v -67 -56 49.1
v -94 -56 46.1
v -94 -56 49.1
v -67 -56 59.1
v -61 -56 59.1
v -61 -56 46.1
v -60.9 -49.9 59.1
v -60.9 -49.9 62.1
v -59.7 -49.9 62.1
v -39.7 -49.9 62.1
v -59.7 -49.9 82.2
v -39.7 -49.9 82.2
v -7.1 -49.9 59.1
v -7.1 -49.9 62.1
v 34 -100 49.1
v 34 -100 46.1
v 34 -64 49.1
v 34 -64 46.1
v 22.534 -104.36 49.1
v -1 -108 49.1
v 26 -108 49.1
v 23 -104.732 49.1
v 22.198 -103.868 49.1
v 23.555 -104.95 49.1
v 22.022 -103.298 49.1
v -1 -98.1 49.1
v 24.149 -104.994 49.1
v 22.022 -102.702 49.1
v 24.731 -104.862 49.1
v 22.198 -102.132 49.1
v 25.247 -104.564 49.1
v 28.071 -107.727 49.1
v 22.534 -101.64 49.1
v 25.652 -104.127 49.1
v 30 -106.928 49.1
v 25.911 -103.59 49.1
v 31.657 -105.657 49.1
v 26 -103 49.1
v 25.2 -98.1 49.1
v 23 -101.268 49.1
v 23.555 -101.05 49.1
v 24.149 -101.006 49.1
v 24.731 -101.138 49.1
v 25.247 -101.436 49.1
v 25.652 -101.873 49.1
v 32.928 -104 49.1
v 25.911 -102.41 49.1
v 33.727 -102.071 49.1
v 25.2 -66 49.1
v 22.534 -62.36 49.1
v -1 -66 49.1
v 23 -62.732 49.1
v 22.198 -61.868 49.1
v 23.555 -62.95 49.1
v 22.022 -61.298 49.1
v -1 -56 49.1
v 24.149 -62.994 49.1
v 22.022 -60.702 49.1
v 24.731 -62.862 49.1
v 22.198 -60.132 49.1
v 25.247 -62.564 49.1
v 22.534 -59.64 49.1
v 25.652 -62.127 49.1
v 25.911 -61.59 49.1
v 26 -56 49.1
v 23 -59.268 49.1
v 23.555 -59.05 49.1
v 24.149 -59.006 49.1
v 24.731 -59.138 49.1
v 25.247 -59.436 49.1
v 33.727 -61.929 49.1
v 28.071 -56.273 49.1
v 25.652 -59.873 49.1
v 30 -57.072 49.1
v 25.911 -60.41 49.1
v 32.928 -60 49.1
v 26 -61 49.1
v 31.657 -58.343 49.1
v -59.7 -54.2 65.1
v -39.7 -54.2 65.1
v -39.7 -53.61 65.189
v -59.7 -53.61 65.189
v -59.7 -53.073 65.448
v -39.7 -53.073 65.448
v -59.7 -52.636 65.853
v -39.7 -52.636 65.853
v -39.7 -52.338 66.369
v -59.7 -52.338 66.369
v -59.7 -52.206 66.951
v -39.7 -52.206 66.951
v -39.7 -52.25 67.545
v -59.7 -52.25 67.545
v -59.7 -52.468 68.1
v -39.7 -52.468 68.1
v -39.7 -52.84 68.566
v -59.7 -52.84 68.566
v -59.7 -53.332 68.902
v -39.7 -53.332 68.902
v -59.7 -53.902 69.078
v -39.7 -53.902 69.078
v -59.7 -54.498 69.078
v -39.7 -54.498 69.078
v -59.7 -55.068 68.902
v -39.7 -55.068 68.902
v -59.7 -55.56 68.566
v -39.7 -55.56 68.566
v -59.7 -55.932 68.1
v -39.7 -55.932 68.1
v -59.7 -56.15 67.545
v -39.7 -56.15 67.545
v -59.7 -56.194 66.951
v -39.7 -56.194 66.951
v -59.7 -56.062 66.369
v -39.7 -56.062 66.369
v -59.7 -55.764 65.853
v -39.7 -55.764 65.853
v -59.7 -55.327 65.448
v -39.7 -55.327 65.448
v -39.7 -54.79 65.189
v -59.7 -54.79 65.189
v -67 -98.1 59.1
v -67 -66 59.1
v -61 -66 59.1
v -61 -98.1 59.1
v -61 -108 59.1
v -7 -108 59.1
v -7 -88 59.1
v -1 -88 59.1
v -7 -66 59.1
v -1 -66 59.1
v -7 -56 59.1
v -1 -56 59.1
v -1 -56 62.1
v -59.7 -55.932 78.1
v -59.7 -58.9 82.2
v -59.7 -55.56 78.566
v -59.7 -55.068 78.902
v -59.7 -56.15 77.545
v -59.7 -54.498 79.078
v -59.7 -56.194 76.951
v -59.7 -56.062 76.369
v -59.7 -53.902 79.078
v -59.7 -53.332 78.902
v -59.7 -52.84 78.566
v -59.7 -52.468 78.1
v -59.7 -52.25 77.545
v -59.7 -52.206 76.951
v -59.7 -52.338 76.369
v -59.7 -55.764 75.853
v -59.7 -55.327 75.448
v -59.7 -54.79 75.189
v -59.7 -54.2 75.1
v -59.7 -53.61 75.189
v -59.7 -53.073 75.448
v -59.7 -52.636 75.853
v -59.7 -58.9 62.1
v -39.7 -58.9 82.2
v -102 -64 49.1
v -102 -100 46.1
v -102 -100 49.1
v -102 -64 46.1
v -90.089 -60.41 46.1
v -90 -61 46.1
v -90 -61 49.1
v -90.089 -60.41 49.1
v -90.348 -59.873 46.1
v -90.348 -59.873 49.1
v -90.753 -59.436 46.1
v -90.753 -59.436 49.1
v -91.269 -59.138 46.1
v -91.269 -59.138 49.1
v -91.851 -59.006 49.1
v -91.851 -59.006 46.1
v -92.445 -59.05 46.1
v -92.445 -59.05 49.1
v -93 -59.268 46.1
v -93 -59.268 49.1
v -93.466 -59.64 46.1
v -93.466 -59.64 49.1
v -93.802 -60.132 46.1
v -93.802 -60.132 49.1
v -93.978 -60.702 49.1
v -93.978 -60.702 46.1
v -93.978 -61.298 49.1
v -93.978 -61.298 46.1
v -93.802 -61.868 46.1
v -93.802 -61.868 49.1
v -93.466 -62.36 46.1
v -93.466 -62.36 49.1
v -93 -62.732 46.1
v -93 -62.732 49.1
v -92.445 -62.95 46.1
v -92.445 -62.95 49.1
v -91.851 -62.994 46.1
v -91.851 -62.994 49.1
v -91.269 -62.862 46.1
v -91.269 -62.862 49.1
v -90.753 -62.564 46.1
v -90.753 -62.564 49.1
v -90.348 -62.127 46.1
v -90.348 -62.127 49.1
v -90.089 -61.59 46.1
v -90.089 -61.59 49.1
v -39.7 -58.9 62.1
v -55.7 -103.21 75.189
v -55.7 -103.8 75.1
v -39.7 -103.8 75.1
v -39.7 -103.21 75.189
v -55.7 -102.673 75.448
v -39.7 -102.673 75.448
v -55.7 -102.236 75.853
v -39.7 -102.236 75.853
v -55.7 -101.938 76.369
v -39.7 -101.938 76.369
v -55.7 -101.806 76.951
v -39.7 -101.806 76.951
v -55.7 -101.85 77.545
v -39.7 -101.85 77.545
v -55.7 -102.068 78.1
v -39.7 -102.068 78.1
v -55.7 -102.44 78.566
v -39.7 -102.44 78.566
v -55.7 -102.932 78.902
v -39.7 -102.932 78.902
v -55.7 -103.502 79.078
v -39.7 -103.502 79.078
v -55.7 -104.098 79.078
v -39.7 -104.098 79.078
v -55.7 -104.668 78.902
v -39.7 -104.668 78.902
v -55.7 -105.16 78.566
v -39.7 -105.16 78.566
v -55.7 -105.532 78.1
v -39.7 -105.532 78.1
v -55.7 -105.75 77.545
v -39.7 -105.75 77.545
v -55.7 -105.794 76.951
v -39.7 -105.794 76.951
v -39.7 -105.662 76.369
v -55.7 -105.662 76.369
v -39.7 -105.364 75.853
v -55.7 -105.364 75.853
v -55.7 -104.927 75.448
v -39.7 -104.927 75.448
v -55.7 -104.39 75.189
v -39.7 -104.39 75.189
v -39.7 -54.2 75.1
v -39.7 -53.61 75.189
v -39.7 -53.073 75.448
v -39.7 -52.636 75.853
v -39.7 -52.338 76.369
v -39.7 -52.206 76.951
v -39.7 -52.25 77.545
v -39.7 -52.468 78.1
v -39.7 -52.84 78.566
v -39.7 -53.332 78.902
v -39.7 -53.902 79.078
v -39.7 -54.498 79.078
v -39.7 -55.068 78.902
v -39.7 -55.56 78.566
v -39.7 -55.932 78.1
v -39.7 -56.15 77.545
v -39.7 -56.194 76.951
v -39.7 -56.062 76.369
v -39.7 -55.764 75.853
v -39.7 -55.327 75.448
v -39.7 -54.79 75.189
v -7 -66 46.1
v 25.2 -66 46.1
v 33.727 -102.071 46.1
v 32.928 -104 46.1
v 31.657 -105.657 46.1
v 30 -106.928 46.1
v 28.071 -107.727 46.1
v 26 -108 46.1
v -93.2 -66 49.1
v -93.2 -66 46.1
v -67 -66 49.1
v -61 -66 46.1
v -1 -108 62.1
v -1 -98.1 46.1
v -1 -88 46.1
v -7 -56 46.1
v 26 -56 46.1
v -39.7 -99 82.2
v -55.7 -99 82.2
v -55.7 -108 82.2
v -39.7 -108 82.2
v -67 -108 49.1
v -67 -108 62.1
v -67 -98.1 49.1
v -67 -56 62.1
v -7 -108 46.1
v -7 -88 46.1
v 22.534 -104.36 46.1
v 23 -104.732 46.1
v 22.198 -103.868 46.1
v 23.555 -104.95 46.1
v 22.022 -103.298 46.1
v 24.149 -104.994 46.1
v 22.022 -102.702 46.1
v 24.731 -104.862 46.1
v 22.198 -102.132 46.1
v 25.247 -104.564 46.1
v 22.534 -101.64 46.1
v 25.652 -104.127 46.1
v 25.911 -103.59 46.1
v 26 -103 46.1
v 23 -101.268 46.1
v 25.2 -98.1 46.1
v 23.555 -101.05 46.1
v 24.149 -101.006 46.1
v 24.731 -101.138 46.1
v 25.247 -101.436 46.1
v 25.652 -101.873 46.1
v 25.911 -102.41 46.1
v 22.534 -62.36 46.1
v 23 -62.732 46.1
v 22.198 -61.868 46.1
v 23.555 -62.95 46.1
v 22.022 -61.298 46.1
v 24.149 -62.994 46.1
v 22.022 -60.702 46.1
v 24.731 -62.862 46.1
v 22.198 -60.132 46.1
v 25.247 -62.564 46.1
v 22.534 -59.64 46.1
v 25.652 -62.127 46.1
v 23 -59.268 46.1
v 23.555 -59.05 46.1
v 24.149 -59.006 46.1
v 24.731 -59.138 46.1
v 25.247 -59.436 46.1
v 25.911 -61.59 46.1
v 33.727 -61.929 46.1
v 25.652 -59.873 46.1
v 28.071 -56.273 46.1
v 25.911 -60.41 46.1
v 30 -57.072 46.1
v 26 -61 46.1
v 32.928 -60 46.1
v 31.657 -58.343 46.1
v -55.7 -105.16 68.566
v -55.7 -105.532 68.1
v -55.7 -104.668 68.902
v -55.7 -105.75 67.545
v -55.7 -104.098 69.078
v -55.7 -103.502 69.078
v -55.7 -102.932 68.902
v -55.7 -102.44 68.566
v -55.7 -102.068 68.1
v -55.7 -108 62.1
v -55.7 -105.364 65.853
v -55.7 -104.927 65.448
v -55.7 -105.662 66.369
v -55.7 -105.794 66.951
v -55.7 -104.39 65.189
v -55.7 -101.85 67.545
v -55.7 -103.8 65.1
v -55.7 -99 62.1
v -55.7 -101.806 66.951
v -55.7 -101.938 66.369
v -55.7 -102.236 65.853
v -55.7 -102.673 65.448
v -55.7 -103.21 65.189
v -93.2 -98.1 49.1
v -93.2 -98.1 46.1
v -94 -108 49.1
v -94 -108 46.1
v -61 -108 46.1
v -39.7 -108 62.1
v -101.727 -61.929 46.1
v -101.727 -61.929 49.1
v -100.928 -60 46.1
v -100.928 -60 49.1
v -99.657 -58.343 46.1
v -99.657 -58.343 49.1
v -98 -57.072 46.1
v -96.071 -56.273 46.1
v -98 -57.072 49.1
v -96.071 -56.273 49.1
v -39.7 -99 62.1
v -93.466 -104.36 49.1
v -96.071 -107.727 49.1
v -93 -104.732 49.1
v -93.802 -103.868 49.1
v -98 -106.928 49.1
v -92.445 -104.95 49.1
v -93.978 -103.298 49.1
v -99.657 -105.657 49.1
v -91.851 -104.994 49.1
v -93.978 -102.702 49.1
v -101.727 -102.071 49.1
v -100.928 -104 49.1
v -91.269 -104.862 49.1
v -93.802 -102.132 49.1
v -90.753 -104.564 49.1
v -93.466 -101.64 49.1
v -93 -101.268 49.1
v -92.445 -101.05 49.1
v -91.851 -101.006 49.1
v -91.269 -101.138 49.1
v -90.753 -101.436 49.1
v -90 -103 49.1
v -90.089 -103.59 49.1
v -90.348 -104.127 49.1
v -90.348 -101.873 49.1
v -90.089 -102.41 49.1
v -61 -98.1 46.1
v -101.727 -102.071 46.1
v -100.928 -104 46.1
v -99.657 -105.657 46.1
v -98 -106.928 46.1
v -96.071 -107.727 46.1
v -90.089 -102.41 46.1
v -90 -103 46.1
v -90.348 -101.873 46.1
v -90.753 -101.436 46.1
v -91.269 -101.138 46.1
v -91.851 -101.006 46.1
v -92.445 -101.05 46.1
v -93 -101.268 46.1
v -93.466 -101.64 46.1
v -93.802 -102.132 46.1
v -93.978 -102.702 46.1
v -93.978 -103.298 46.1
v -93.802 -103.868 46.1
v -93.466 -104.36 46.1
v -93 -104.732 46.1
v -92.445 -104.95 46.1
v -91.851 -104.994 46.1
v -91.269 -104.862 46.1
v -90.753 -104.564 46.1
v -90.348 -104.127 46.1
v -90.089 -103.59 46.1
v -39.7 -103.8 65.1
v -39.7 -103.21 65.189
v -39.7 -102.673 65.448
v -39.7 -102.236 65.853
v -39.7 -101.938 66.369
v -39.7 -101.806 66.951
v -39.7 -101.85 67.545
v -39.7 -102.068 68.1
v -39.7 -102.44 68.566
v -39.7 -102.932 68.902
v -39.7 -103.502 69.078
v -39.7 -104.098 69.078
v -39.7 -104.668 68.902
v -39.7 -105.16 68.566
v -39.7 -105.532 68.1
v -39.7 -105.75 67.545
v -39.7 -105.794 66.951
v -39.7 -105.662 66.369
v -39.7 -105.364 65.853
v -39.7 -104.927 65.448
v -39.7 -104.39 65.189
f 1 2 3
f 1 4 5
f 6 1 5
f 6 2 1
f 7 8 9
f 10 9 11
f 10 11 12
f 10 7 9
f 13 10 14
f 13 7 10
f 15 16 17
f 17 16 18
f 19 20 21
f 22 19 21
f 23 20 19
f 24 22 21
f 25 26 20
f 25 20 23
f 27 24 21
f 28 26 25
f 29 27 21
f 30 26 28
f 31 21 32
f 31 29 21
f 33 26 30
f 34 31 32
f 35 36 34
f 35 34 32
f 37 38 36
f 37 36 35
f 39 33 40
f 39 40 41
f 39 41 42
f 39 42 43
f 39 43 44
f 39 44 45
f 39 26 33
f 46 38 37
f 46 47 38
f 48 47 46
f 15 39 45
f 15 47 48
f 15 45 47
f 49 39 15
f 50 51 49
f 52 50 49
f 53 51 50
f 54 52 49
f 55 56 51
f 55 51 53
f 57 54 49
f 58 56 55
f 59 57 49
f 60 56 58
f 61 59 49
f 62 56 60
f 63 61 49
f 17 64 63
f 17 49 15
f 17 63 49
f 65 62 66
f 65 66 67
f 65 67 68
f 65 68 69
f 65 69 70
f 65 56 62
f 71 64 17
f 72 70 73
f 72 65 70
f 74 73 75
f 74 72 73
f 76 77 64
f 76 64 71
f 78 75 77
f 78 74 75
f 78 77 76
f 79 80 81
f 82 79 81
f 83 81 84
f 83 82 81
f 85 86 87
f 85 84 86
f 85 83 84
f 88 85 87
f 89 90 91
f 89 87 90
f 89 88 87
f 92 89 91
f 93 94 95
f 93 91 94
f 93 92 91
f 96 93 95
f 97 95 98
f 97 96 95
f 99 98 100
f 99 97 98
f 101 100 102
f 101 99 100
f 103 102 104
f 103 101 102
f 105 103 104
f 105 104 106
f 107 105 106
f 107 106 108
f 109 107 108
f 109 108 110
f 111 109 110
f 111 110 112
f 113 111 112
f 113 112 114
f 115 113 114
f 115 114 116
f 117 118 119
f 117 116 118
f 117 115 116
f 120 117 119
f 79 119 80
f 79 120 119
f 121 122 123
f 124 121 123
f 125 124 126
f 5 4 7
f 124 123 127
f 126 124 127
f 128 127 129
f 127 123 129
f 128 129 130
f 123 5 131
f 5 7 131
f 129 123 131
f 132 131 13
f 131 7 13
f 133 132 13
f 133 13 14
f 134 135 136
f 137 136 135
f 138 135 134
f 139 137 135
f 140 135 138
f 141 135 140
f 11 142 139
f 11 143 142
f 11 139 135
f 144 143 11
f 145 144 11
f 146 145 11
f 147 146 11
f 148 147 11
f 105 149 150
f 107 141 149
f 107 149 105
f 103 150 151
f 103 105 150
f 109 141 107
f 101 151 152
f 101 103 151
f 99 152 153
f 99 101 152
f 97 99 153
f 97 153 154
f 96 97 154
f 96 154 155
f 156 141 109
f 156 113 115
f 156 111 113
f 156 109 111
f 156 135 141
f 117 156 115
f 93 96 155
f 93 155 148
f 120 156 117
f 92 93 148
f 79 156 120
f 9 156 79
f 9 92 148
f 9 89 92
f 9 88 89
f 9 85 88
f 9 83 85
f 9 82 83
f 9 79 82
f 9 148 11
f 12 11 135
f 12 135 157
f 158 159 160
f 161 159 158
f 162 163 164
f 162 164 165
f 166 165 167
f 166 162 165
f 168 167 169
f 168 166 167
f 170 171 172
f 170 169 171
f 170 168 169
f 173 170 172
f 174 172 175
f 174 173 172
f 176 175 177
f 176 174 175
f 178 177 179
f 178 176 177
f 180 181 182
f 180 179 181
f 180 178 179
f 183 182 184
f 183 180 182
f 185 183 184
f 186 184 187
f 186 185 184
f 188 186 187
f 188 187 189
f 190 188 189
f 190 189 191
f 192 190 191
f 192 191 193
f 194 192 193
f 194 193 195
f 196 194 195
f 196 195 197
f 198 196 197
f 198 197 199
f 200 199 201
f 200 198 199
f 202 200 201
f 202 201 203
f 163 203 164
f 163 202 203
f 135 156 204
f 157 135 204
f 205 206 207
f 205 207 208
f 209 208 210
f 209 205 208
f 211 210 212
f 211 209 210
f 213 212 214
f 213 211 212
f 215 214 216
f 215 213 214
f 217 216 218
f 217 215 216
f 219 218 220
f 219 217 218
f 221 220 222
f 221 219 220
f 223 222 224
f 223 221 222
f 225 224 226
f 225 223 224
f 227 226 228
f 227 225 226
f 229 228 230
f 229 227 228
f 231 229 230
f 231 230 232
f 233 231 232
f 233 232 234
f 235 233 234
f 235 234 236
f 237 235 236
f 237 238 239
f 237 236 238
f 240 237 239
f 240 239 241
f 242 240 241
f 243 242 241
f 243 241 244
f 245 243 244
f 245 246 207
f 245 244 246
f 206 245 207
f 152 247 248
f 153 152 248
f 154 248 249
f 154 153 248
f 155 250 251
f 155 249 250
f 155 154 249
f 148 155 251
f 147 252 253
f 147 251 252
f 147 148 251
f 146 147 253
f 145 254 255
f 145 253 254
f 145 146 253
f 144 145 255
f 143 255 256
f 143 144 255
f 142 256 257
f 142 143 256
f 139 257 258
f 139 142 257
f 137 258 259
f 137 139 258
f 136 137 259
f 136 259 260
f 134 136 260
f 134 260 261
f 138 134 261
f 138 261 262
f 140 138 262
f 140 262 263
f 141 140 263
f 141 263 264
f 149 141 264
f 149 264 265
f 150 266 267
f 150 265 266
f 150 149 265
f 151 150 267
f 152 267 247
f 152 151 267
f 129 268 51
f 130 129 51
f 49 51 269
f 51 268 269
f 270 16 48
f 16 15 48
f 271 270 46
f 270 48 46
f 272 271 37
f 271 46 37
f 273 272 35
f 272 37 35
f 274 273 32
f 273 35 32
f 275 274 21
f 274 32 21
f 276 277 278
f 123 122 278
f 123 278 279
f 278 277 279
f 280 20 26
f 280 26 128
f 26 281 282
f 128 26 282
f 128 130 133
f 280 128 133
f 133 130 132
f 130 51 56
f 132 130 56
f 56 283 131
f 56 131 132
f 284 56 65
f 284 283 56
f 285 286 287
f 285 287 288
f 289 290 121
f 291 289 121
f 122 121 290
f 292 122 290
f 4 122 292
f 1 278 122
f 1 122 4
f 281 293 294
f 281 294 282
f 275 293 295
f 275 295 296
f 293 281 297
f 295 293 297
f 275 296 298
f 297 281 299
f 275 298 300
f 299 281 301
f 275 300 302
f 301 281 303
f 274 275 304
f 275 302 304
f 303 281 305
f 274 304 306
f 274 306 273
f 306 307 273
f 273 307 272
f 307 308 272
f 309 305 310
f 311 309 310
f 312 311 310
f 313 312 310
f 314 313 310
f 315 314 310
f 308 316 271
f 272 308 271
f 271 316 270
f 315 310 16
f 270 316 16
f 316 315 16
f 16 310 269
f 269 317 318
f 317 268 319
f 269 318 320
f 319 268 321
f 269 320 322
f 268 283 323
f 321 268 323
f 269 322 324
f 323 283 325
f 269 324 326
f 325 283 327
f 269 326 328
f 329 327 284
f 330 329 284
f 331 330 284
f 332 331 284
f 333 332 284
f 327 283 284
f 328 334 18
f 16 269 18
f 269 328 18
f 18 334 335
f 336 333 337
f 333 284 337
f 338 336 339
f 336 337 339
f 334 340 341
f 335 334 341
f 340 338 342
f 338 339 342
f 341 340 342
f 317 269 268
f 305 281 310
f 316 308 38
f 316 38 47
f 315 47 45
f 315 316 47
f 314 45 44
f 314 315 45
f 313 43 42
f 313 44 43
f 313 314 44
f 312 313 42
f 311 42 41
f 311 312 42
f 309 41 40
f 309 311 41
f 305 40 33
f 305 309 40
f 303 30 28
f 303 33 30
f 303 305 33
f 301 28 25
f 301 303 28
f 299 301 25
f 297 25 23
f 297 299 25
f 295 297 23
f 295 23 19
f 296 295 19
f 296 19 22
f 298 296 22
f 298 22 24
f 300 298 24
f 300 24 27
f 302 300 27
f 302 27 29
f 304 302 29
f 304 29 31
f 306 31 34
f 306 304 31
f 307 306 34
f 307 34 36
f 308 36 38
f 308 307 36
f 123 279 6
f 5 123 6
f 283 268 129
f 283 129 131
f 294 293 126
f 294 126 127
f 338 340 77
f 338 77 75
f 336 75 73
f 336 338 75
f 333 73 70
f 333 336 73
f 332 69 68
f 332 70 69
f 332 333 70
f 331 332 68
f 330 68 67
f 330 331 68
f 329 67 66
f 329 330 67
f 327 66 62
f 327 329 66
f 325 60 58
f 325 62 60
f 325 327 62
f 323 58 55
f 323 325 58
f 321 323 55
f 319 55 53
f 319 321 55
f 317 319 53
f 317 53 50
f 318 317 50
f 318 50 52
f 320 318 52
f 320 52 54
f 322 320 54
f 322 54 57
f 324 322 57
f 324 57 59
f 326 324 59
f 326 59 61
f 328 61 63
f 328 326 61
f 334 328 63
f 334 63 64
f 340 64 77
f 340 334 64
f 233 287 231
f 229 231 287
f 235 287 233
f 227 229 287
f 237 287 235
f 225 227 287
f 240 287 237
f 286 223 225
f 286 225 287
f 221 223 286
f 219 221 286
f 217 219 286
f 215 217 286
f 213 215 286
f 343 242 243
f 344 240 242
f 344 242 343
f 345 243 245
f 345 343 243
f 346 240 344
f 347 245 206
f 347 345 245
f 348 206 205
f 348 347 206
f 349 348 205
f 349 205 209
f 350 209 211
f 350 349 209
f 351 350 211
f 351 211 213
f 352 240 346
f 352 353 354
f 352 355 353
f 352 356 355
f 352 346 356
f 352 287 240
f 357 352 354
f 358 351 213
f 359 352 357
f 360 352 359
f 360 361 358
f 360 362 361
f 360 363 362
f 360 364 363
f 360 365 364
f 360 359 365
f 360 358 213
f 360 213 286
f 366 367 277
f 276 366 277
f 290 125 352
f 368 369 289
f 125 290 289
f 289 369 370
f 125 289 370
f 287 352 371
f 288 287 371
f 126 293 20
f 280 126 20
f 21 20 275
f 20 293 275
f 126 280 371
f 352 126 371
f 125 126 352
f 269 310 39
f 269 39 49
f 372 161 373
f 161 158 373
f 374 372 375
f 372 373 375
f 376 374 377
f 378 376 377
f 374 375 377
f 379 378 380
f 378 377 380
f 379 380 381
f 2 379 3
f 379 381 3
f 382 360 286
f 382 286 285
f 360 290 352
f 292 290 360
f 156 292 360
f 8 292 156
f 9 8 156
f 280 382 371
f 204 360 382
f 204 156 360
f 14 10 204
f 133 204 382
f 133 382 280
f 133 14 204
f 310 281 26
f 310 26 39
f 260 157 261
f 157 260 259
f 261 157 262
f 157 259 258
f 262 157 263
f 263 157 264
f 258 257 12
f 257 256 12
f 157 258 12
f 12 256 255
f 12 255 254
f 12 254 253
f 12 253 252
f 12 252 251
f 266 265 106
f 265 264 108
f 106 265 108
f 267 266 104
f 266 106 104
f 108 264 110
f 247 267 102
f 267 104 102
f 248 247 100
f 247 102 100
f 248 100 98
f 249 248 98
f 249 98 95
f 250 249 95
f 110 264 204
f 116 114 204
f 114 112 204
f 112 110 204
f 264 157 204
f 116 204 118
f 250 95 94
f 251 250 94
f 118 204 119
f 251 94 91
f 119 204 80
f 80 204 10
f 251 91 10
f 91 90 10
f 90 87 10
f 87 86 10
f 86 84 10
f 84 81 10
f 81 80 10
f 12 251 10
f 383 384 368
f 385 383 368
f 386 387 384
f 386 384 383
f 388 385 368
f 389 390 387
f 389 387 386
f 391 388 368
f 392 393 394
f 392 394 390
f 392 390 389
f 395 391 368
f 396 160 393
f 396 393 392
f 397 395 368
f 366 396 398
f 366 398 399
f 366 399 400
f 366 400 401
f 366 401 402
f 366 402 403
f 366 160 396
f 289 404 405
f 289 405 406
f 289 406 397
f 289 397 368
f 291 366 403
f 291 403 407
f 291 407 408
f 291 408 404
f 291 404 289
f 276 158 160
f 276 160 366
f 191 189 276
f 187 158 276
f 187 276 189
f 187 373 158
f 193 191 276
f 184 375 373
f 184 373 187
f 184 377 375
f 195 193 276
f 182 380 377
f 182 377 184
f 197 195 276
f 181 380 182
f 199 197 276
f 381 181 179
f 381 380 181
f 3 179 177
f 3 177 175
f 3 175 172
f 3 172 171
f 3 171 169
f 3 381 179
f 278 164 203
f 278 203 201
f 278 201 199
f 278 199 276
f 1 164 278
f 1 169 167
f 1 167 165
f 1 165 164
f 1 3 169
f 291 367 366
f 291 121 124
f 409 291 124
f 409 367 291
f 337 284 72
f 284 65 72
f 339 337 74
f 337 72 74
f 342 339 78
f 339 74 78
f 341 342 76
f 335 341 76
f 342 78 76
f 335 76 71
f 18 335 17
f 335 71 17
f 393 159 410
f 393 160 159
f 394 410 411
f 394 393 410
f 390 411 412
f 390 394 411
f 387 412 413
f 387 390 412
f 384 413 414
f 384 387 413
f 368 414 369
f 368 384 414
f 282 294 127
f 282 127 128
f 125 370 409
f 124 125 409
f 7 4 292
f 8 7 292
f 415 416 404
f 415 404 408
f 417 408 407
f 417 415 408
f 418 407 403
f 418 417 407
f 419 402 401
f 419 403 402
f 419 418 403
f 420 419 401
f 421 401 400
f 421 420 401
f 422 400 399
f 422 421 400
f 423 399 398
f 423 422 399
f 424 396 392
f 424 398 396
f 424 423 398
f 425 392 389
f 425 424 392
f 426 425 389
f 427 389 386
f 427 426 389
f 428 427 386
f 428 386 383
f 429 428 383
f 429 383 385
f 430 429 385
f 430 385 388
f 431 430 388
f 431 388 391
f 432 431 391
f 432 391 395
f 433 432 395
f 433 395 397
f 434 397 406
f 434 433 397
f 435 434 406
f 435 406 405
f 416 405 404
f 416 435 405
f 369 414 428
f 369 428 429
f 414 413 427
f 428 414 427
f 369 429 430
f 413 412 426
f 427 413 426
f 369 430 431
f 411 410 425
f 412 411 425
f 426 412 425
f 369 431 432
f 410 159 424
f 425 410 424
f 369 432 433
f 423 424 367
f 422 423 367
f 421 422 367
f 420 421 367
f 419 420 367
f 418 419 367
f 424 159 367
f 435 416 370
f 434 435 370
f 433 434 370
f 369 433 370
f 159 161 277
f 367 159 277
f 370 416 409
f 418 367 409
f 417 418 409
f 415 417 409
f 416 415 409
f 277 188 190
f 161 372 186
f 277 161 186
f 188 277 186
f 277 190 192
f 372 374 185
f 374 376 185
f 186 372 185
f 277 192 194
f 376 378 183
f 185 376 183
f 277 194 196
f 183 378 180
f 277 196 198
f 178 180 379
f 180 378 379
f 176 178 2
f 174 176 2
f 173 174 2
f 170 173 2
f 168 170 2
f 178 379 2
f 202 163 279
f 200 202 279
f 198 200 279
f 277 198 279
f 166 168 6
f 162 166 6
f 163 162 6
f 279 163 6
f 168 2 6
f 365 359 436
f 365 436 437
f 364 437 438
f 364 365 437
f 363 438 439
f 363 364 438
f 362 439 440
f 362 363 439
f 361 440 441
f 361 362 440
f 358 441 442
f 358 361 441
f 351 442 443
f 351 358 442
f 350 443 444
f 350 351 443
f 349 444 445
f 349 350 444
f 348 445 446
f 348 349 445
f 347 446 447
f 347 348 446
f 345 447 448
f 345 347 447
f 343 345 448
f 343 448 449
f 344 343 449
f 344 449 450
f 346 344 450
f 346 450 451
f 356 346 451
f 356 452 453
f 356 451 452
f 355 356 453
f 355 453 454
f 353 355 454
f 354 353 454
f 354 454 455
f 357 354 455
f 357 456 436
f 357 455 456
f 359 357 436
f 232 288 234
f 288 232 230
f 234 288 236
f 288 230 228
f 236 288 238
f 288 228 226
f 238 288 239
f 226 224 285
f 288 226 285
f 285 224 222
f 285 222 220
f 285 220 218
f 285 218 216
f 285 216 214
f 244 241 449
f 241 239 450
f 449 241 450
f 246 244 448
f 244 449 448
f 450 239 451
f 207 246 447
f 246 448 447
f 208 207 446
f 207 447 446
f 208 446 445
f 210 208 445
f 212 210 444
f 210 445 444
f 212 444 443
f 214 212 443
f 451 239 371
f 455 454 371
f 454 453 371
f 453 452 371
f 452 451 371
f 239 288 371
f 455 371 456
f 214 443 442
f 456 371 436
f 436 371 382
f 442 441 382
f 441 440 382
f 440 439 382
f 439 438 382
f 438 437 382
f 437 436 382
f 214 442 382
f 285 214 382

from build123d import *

# Parameters (mm, degrees)
CYLINDER382_R     = 2
CYLINDER382_DEPTH = 70
CYLINDER383_R     = 2
CYLINDER383_DEPTH = 70
BOX476_W          = 8.8
BOX476_H          = 52
BOX476_DEPTH      = 3
BOX473_W          = 41
BOX473_H          = 10
BOX473_DEPTH      = 3
BOX471_W          = 41
BOX471_H          = 9.9
BOX471_DEPTH      = 3
FILLET021_R       = 8
BOX411_W          = 6
BOX411_H          = 10
BOX411_DEPTH      = 16
BOX286_W          = 6
BOX286_H          = 9.9
BOX286_DEPTH      = 16
BOX409_W          = 6
BOX409_H          = 10
BOX409_DEPTH      = 16
BOX288_W          = 6
BOX288_H          = 20
BOX288_DEPTH      = 16
CYLINDER180_R     = 2
CYLINDER180_DEPTH = 33
CYLINDER179_R     = 2
CYLINDER179_DEPTH = 30
CYLINDER182_R     = 2
CYLINDER182_DEPTH = 33
CYLINDER181_R     = 2
CYLINDER181_DEPTH = 30
BOX408_W          = 20
BOX408_H          = 9
BOX408_DEPTH      = 20.1
BOX281_W          = 16
BOX281_H          = 9
BOX281_DEPTH      = 20.1
BOX283_W          = 66
BOX283_H          = 58.1
BOX283_DEPTH      = 3
CHAMFER044_SIZE   = 6.1
CYLINDER380_R     = 2
CYLINDER380_DEPTH = 65
CYLINDER381_R     = 2
CYLINDER381_DEPTH = 65
BOX475_W          = 8.8
BOX475_H          = 52
BOX475_DEPTH      = 3
BOX474_W          = 41
BOX474_H          = 10
BOX474_DEPTH      = 3
BOX472_W          = 41
BOX472_H          = 9.9
BOX472_DEPTH      = 3
FILLET019_R       = 8


with BuildPart() as cylinder382:
    # Cylinder382 → Cylinder382 (new body)
    with BuildSketch(Plane(origin=(-90, -103, -10), x_dir=(1, 0, 0), z_dir=(0, 0, 1))):
        Circle(CYLINDER382_R)
    extrude(amount=CYLINDER382_DEPTH)


with BuildPart() as fusion374:
    # Cylinder383 → Cylinder383 (new body)
    with BuildSketch(Plane(origin=(-90, -61, -10), x_dir=(1, 0, 0), z_dir=(0, 0, 1))):
        Circle(CYLINDER383_R)
    extrude(amount=CYLINDER383_DEPTH)

    # Fusion374: union Cylinder382
    add(cylinder382.part)


with BuildPart() as fusion374_1:
    # Fusion374 placement: moved
    add(fusion374.part.moved(Location((114, 0, 0))))


with BuildPart() as box476:
    # Box476 → Box476 (new body)
    with BuildSketch(Plane(origin=(25.2, -108, 46.1), x_dir=(1, 0, 0), z_dir=(0, 0, 1))):
        with Locations((4.4, 26)):
            Rectangle(BOX476_W, BOX476_H)
    extrude(amount=BOX476_DEPTH)


with BuildPart() as box473:
    # Box473 → Box473 (new body)
    with BuildSketch(Plane(origin=(-7, -66, 46.1), x_dir=(1, 0, 0), z_dir=(0, 0, 1))):
        with Locations((20.5, 5)):
            Rectangle(BOX473_W, BOX473_H)
    extrude(amount=BOX473_DEPTH)


with BuildPart() as fillet021:
    # Box471 → Box471 (new body)
    with BuildSketch(Plane(origin=(-7, -108, 46.1), x_dir=(1, 0, 0), z_dir=(0, 0, 1))):
        with Locations((20.5, 4.95)):
            Rectangle(BOX471_W, BOX471_H)
    extrude(amount=BOX471_DEPTH)

    # Fusion376: union Box476, Box473
    add(box476.part)
    add(box473.part)

    # Cut414: cut Fusion374
    add(fusion374_1.part, mode=Mode.SUBTRACT)

    # Fillet021
    fillet021_edges = [fillet021.edges().sort_by_distance(p)[0] for p in [
        (34, -108, 47.6),
        (34, -56, 47.6),
    ]]
    fillet(fillet021_edges, radius=FILLET021_R)


with BuildPart() as box411:
    # Box411 → Box411 (new body)
    with BuildSketch(Plane(origin=(-7, -66, 46.1), x_dir=(1, 0, 0), z_dir=(0, 0, 1))):
        with Locations((3, 5)):
            Rectangle(BOX411_W, BOX411_H)
    extrude(amount=BOX411_DEPTH)


with BuildPart() as box286:
    # Box286 → Box286 (new body)
    with BuildSketch(Plane(origin=(-67, -108, 46.1), x_dir=(1, 0, 0), z_dir=(0, 0, 1))):
        with Locations((3, 4.95)):
            Rectangle(BOX286_W, BOX286_H)
    extrude(amount=BOX286_DEPTH)


with BuildPart() as box409:
    # Box409 → Box409 (new body)
    with BuildSketch(Plane(origin=(-67, -66, 46.1), x_dir=(1, 0, 0), z_dir=(0, 0, 1))):
        with Locations((3, 5)):
            Rectangle(BOX409_W, BOX409_H)
    extrude(amount=BOX409_DEPTH)


with BuildPart() as fusion377:
    # Box288 → Box288 (new body)
    with BuildSketch(Plane(origin=(-7, -108, 46.1), x_dir=(1, 0, 0), z_dir=(0, 0, 1))):
        with Locations((3, 10)):
            Rectangle(BOX288_W, BOX288_H)
    extrude(amount=BOX288_DEPTH)

    # Fusion377: union Box411, Box286, Box409
    add(box411.part)
    add(box286.part)
    add(box409.part)


with BuildPart() as cylinder180:
    # Cylinder180 → Cylinder180 (new body)
    with BuildSketch(Plane(origin=(-74.6, -105.8, 63), x_dir=(0, 0, -1), z_dir=(1, 0, 0))):
        Circle(CYLINDER180_R)
    extrude(amount=CYLINDER180_DEPTH)


with BuildPart() as fusion247:
    # Cylinder179 → Cylinder179 (new body)
    with BuildSketch(Plane(origin=(-71.6, -105.8, 73), x_dir=(0, 0, -1), z_dir=(1, 0, 0))):
        Circle(CYLINDER179_R)
    extrude(amount=CYLINDER179_DEPTH)

    # Fusion247: union Cylinder180
    add(cylinder180.part)


with BuildPart() as fusion247_1:
    # Fusion247 placement: moved
    add(fusion247.part.moved(Location((0, 2, 4))))


with BuildPart() as cylinder182:
    # Cylinder182 → Cylinder182 (new body)
    with BuildSketch(Plane(origin=(-74.6, -56.2, 63), x_dir=(0, 0, -1), z_dir=(1, 0, 0))):
        Circle(CYLINDER182_R)
    extrude(amount=CYLINDER182_DEPTH)


with BuildPart() as fusion252:
    # Cylinder181 → Cylinder181 (new body)
    with BuildSketch(Plane(origin=(-71.6, -56.2, 73), x_dir=(0, 0, -1), z_dir=(1, 0, 0))):
        Circle(CYLINDER181_R)
    extrude(amount=CYLINDER181_DEPTH)

    # Fusion246: union Cylinder182
    add(cylinder182.part)


with BuildPart() as fusion252_1:
    # Fusion246 placement: moved
    add(fusion252.part.moved(Location((0, 2, 4))))

    # Fusion252: union Fusion247
    add(fusion247_1.part)


with BuildPart() as box408:
    # Box408 → Box408 (new body)
    with BuildSketch(Plane(origin=(-64.3, -58.9, 62), x_dir=(1, 0, 0), z_dir=(0, 0, 1))):
        with Locations((10, 4.5)):
            Rectangle(BOX408_W, BOX408_H)
    extrude(amount=BOX408_DEPTH)


with BuildPart() as box281:
    # Box281 → Box281 (new body)
    with BuildSketch(Plane(origin=(-60.3, -108, 62), x_dir=(1, 0, 0), z_dir=(0, 0, 1))):
        with Locations((8, 4.5)):
            Rectangle(BOX281_W, BOX281_H)
    extrude(amount=BOX281_DEPTH)


with BuildPart() as chamfer044:
    # Box283 → Box283 (new body)
    with BuildSketch(Plane(origin=(-71.6, -108, 59), x_dir=(1, 0, 0), z_dir=(0, 0, 1))):
        with Locations((33, 29.05)):
            Rectangle(BOX283_W, BOX283_H)
    extrude(amount=BOX283_DEPTH)

    # Fusion372: union Box408, Box281
    add(box408.part)
    add(box281.part)

    # Cut412: cut Fusion252
    add(fusion252_1.part, mode=Mode.SUBTRACT)


with BuildPart() as chamfer044_1:
    # Cut412 placement: moved
    add(chamfer044.part.moved(Location((4.7, 0, 0.1))))

    # Chamfer044
    chamfer044_edges = [chamfer044_1.edges().sort_by_distance(p)[0] for p in [
        (-66.9, -49.9, 60.6),
        (-0.9, -49.9, 60.6),
    ]]
    chamfer(chamfer044_edges, length=CHAMFER044_SIZE)


with BuildPart() as chamfer044_2:
    # Chamfer044 placement: moved
    add(chamfer044_1.part.moved(Location((-0.1, 0, 0))))


with BuildPart() as cylinder380:
    # Cylinder380 → Cylinder380 (new body)
    with BuildSketch(Plane(origin=(-90, -103, -10), x_dir=(1, 0, 0), z_dir=(0, 0, 1))):
        Circle(CYLINDER380_R)
    extrude(amount=CYLINDER380_DEPTH)


with BuildPart() as fusion373:
    # Cylinder381 → Cylinder381 (new body)
    with BuildSketch(Plane(origin=(-90, -61, -10), x_dir=(1, 0, 0), z_dir=(0, 0, 1))):
        Circle(CYLINDER381_R)
    extrude(amount=CYLINDER381_DEPTH)

    # Fusion373: union Cylinder380
    add(cylinder380.part)


with BuildPart() as fusion373_1:
    # Fusion373 placement: moved
    add(fusion373.part.moved(Location((-2, 0, 0))))


with BuildPart() as box475:
    # Box475 → Box475 (new body)
    with BuildSketch(Plane(origin=(-102, -108, 46.1), x_dir=(1, 0, 0), z_dir=(0, 0, 1))):
        with Locations((4.4, 26)):
            Rectangle(BOX475_W, BOX475_H)
    extrude(amount=BOX475_DEPTH)


with BuildPart() as box474:
    # Box474 → Box474 (new body)
    with BuildSketch(Plane(origin=(-102, -66, 46.1), x_dir=(1, 0, 0), z_dir=(0, 0, 1))):
        with Locations((20.5, 5)):
            Rectangle(BOX474_W, BOX474_H)
    extrude(amount=BOX474_DEPTH)


with BuildPart() as rescue_arm_stand:
    # Box472 → Box472 (new body)
    with BuildSketch(Plane(origin=(-102, -108, 46.1), x_dir=(1, 0, 0), z_dir=(0, 0, 1))):
        with Locations((20.5, 4.95)):
            Rectangle(BOX472_W, BOX472_H)
    extrude(amount=BOX472_DEPTH)

    # Fusion375: union Box475, Box474
    add(box475.part)
    add(box474.part)

    # Cut413: cut Fusion373
    add(fusion373_1.part, mode=Mode.SUBTRACT)

    # Fillet019
    fillet019_edges = [rescue_arm_stand.edges().sort_by_distance(p)[0] for p in [
        (-102, -108, 47.6),
        (-102, -56, 47.6),
    ]]
    fillet(fillet019_edges, radius=FILLET019_R)

    # Fusion378: union Fillet021, Fusion377, Chamfer044
    add(fillet021.part)
    add(fusion377.part)
    add(chamfer044_2.part)


solid = rescue_arm_stand.part
